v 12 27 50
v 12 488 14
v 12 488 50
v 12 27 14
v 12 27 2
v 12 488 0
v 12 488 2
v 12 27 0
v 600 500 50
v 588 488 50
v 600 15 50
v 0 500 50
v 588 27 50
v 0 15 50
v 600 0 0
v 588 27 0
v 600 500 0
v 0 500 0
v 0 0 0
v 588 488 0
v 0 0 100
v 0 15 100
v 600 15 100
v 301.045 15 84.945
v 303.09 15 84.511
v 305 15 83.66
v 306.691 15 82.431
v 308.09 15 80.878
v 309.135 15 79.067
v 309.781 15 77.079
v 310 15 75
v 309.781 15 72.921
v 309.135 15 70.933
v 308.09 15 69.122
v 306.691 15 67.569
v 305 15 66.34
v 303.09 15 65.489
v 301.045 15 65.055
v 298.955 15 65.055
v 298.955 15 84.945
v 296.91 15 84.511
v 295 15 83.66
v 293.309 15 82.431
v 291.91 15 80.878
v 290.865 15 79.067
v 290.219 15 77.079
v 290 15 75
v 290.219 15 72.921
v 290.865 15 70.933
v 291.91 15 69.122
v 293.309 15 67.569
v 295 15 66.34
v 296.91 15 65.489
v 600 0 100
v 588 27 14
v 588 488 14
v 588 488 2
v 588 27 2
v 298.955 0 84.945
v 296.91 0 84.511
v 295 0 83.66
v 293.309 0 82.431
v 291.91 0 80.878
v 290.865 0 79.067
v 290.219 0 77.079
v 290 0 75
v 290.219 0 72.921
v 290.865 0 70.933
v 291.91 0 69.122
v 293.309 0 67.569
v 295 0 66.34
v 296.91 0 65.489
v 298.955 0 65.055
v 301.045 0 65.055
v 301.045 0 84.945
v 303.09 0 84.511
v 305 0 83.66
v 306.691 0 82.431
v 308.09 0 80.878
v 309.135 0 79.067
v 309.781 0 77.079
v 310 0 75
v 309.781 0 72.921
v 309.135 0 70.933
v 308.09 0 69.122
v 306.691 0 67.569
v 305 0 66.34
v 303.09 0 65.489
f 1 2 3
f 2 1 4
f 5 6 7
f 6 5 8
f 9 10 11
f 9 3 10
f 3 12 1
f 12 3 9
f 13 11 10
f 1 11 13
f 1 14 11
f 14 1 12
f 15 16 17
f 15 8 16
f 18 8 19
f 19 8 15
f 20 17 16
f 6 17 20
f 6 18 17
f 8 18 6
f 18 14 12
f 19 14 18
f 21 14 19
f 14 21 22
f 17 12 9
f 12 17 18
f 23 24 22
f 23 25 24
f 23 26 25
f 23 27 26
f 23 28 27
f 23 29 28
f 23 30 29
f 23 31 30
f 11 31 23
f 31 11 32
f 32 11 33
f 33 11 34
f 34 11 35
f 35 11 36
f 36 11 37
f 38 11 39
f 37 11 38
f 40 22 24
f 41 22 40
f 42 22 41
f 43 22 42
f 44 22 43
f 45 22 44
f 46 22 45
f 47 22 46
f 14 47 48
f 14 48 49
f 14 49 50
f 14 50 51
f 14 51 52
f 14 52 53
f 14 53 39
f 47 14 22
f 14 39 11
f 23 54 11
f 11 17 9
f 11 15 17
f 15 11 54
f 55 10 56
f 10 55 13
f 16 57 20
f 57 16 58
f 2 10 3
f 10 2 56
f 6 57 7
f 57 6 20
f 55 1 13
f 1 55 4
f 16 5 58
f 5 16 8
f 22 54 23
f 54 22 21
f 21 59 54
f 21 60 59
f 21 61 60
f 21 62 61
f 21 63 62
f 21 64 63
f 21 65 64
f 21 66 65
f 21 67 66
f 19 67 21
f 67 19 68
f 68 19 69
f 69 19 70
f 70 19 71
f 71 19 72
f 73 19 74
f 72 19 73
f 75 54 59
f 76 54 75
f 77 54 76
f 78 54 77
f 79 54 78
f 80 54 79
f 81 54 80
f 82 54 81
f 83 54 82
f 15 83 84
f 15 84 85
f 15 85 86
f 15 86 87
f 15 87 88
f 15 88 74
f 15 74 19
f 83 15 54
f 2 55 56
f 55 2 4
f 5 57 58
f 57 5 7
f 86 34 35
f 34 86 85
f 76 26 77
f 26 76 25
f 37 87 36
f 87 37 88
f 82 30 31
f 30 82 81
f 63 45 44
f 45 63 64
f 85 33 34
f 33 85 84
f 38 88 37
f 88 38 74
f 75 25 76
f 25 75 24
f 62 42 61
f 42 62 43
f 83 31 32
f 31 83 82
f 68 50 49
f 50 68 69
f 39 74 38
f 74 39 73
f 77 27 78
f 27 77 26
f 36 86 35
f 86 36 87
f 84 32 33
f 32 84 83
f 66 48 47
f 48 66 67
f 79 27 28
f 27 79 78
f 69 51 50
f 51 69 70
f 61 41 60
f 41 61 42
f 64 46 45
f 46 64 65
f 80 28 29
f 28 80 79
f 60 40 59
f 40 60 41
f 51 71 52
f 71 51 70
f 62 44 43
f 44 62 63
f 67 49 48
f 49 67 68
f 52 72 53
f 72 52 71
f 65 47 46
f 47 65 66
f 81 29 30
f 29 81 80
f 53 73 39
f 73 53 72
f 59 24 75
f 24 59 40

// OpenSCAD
/*

    Simple Drawer
    
    By Anton Augustsson


*/



module simpleDrawer (
    thicknessBottom,
    thicknessSide,
    thicknessFront,
    lenghtDrawer,
    widthDrawer,
    heightDrawer,
    xDrawer,yDrawer,zDrawer
    ){
/*
    ---------- Local varibles ---------- 
*/

length = lenghtDrawer;
width  = widthDrawer;
height = heightDrawer;
heightSide = height/2;

x=xDrawer;
y=yDrawer;
z=zDrawer;

/*
    ---------- Code ---------- 
*/

translate([
    x,
    y,
    z]) 
difference () {
union () {

// Left
color("Wheat")
translate([
    0,
    thicknessFront,
    0]) 
cube(size = [
    thicknessSide,
    length-thicknessFront,
    heightSide]);

// Right
color("Wheat")
translate([
    width-thicknessSide,
    thicknessFront,
    0]) 
cube(size = [
    thicknessSide,
    length-thicknessFront,
    heightSide]);
    
// Back
color("Wheat")
translate([
    thicknessSide,
    length-thicknessSide,
    0]) 
cube(size = [
    width-thicknessSide*2,
    thicknessSide,
    heightSide]);

// Front
color("BurlyWood")
translate([
    thicknessSide,
    thicknessFront,
    0]) 
cube(size = [
    width-thicknessSide*2,
    thicknessSide,
    heightSide]);    

// Front face
color("BurlyWood")
translate([
    0,
    0,
    0]) 
cube(size = [
    width,
    thicknessFront,
    height]);    

// Bottom 
color("Wheat")
translate([
    thicknessSide,
    thicknessFront+thicknessSide,
    2]) 
cube(size = [
    width-thicknessSide*2,
    length-thicknessFront-thicknessSide*2,
    thicknessBottom]);

}


translate([
    width/2,                   
    -1,   
    height/4*3
    ])  
rotate([270,0,0])
cylinder(
    h = thicknessFront+2,    
    r = 10        
    );      

}}
    
/*
    ---------- Example ---------- 
*/


thicknessBottom = 12;
thicknessSide   = 12;
thicknessFront  = 15;

length = 500;
width  = 600;
height = 100;


x=0;
y=0;
z=0;
yRotate=0;

simpleDrawer (
    thicknessBottom,
    thicknessSide,
    thicknessFront,
    length,
    width,
    height,
    x,y,z
    );
